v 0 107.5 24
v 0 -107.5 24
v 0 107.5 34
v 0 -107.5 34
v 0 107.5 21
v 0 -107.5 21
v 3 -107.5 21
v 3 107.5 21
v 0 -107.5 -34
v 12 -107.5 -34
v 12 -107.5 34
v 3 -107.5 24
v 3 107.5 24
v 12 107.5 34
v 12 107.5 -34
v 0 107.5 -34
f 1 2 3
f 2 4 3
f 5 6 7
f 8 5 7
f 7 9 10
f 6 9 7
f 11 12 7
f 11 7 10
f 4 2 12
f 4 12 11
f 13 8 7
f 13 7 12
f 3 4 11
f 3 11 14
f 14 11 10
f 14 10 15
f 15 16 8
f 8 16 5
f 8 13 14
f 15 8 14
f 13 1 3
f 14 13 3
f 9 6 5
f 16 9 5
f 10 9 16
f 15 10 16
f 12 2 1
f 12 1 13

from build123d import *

# Parameters (mm, degrees)
F0_W      = 215
F0_H      = 68
F1_DEPTH  = 12
F2_W      = 3
F2_H      = 3
F3_DEPTH  = 300
F3_FACE_W = 3
F3_FACE_H = 3
F5_DEPTH  = 800


with BuildPart() as f1:
    # F0 (on Right) → F1 (new body)
    with BuildSketch(Plane.YZ):
        Rectangle(F0_W, F0_H)
    extrude(amount=F1_DEPTH)

    # F2 (on face) → F3 (join)
    with BuildSketch(Plane.XZ.offset(107.5)):
        with Locations((1.5, 22.5)):
            Rectangle(F2_W, F2_H)
    extrude(amount=F3_DEPTH)

    # F3_face (on face) → F5 (cut)
    with BuildSketch(Plane(origin=(1.5, -407.5, 22.5), x_dir=(1, 0, 0), z_dir=(0, -1, 0))):
        Rectangle(F3_FACE_W, F3_FACE_H)
    extrude(amount=-F5_DEPTH, mode=Mode.SUBTRACT)


solid = f1.part
